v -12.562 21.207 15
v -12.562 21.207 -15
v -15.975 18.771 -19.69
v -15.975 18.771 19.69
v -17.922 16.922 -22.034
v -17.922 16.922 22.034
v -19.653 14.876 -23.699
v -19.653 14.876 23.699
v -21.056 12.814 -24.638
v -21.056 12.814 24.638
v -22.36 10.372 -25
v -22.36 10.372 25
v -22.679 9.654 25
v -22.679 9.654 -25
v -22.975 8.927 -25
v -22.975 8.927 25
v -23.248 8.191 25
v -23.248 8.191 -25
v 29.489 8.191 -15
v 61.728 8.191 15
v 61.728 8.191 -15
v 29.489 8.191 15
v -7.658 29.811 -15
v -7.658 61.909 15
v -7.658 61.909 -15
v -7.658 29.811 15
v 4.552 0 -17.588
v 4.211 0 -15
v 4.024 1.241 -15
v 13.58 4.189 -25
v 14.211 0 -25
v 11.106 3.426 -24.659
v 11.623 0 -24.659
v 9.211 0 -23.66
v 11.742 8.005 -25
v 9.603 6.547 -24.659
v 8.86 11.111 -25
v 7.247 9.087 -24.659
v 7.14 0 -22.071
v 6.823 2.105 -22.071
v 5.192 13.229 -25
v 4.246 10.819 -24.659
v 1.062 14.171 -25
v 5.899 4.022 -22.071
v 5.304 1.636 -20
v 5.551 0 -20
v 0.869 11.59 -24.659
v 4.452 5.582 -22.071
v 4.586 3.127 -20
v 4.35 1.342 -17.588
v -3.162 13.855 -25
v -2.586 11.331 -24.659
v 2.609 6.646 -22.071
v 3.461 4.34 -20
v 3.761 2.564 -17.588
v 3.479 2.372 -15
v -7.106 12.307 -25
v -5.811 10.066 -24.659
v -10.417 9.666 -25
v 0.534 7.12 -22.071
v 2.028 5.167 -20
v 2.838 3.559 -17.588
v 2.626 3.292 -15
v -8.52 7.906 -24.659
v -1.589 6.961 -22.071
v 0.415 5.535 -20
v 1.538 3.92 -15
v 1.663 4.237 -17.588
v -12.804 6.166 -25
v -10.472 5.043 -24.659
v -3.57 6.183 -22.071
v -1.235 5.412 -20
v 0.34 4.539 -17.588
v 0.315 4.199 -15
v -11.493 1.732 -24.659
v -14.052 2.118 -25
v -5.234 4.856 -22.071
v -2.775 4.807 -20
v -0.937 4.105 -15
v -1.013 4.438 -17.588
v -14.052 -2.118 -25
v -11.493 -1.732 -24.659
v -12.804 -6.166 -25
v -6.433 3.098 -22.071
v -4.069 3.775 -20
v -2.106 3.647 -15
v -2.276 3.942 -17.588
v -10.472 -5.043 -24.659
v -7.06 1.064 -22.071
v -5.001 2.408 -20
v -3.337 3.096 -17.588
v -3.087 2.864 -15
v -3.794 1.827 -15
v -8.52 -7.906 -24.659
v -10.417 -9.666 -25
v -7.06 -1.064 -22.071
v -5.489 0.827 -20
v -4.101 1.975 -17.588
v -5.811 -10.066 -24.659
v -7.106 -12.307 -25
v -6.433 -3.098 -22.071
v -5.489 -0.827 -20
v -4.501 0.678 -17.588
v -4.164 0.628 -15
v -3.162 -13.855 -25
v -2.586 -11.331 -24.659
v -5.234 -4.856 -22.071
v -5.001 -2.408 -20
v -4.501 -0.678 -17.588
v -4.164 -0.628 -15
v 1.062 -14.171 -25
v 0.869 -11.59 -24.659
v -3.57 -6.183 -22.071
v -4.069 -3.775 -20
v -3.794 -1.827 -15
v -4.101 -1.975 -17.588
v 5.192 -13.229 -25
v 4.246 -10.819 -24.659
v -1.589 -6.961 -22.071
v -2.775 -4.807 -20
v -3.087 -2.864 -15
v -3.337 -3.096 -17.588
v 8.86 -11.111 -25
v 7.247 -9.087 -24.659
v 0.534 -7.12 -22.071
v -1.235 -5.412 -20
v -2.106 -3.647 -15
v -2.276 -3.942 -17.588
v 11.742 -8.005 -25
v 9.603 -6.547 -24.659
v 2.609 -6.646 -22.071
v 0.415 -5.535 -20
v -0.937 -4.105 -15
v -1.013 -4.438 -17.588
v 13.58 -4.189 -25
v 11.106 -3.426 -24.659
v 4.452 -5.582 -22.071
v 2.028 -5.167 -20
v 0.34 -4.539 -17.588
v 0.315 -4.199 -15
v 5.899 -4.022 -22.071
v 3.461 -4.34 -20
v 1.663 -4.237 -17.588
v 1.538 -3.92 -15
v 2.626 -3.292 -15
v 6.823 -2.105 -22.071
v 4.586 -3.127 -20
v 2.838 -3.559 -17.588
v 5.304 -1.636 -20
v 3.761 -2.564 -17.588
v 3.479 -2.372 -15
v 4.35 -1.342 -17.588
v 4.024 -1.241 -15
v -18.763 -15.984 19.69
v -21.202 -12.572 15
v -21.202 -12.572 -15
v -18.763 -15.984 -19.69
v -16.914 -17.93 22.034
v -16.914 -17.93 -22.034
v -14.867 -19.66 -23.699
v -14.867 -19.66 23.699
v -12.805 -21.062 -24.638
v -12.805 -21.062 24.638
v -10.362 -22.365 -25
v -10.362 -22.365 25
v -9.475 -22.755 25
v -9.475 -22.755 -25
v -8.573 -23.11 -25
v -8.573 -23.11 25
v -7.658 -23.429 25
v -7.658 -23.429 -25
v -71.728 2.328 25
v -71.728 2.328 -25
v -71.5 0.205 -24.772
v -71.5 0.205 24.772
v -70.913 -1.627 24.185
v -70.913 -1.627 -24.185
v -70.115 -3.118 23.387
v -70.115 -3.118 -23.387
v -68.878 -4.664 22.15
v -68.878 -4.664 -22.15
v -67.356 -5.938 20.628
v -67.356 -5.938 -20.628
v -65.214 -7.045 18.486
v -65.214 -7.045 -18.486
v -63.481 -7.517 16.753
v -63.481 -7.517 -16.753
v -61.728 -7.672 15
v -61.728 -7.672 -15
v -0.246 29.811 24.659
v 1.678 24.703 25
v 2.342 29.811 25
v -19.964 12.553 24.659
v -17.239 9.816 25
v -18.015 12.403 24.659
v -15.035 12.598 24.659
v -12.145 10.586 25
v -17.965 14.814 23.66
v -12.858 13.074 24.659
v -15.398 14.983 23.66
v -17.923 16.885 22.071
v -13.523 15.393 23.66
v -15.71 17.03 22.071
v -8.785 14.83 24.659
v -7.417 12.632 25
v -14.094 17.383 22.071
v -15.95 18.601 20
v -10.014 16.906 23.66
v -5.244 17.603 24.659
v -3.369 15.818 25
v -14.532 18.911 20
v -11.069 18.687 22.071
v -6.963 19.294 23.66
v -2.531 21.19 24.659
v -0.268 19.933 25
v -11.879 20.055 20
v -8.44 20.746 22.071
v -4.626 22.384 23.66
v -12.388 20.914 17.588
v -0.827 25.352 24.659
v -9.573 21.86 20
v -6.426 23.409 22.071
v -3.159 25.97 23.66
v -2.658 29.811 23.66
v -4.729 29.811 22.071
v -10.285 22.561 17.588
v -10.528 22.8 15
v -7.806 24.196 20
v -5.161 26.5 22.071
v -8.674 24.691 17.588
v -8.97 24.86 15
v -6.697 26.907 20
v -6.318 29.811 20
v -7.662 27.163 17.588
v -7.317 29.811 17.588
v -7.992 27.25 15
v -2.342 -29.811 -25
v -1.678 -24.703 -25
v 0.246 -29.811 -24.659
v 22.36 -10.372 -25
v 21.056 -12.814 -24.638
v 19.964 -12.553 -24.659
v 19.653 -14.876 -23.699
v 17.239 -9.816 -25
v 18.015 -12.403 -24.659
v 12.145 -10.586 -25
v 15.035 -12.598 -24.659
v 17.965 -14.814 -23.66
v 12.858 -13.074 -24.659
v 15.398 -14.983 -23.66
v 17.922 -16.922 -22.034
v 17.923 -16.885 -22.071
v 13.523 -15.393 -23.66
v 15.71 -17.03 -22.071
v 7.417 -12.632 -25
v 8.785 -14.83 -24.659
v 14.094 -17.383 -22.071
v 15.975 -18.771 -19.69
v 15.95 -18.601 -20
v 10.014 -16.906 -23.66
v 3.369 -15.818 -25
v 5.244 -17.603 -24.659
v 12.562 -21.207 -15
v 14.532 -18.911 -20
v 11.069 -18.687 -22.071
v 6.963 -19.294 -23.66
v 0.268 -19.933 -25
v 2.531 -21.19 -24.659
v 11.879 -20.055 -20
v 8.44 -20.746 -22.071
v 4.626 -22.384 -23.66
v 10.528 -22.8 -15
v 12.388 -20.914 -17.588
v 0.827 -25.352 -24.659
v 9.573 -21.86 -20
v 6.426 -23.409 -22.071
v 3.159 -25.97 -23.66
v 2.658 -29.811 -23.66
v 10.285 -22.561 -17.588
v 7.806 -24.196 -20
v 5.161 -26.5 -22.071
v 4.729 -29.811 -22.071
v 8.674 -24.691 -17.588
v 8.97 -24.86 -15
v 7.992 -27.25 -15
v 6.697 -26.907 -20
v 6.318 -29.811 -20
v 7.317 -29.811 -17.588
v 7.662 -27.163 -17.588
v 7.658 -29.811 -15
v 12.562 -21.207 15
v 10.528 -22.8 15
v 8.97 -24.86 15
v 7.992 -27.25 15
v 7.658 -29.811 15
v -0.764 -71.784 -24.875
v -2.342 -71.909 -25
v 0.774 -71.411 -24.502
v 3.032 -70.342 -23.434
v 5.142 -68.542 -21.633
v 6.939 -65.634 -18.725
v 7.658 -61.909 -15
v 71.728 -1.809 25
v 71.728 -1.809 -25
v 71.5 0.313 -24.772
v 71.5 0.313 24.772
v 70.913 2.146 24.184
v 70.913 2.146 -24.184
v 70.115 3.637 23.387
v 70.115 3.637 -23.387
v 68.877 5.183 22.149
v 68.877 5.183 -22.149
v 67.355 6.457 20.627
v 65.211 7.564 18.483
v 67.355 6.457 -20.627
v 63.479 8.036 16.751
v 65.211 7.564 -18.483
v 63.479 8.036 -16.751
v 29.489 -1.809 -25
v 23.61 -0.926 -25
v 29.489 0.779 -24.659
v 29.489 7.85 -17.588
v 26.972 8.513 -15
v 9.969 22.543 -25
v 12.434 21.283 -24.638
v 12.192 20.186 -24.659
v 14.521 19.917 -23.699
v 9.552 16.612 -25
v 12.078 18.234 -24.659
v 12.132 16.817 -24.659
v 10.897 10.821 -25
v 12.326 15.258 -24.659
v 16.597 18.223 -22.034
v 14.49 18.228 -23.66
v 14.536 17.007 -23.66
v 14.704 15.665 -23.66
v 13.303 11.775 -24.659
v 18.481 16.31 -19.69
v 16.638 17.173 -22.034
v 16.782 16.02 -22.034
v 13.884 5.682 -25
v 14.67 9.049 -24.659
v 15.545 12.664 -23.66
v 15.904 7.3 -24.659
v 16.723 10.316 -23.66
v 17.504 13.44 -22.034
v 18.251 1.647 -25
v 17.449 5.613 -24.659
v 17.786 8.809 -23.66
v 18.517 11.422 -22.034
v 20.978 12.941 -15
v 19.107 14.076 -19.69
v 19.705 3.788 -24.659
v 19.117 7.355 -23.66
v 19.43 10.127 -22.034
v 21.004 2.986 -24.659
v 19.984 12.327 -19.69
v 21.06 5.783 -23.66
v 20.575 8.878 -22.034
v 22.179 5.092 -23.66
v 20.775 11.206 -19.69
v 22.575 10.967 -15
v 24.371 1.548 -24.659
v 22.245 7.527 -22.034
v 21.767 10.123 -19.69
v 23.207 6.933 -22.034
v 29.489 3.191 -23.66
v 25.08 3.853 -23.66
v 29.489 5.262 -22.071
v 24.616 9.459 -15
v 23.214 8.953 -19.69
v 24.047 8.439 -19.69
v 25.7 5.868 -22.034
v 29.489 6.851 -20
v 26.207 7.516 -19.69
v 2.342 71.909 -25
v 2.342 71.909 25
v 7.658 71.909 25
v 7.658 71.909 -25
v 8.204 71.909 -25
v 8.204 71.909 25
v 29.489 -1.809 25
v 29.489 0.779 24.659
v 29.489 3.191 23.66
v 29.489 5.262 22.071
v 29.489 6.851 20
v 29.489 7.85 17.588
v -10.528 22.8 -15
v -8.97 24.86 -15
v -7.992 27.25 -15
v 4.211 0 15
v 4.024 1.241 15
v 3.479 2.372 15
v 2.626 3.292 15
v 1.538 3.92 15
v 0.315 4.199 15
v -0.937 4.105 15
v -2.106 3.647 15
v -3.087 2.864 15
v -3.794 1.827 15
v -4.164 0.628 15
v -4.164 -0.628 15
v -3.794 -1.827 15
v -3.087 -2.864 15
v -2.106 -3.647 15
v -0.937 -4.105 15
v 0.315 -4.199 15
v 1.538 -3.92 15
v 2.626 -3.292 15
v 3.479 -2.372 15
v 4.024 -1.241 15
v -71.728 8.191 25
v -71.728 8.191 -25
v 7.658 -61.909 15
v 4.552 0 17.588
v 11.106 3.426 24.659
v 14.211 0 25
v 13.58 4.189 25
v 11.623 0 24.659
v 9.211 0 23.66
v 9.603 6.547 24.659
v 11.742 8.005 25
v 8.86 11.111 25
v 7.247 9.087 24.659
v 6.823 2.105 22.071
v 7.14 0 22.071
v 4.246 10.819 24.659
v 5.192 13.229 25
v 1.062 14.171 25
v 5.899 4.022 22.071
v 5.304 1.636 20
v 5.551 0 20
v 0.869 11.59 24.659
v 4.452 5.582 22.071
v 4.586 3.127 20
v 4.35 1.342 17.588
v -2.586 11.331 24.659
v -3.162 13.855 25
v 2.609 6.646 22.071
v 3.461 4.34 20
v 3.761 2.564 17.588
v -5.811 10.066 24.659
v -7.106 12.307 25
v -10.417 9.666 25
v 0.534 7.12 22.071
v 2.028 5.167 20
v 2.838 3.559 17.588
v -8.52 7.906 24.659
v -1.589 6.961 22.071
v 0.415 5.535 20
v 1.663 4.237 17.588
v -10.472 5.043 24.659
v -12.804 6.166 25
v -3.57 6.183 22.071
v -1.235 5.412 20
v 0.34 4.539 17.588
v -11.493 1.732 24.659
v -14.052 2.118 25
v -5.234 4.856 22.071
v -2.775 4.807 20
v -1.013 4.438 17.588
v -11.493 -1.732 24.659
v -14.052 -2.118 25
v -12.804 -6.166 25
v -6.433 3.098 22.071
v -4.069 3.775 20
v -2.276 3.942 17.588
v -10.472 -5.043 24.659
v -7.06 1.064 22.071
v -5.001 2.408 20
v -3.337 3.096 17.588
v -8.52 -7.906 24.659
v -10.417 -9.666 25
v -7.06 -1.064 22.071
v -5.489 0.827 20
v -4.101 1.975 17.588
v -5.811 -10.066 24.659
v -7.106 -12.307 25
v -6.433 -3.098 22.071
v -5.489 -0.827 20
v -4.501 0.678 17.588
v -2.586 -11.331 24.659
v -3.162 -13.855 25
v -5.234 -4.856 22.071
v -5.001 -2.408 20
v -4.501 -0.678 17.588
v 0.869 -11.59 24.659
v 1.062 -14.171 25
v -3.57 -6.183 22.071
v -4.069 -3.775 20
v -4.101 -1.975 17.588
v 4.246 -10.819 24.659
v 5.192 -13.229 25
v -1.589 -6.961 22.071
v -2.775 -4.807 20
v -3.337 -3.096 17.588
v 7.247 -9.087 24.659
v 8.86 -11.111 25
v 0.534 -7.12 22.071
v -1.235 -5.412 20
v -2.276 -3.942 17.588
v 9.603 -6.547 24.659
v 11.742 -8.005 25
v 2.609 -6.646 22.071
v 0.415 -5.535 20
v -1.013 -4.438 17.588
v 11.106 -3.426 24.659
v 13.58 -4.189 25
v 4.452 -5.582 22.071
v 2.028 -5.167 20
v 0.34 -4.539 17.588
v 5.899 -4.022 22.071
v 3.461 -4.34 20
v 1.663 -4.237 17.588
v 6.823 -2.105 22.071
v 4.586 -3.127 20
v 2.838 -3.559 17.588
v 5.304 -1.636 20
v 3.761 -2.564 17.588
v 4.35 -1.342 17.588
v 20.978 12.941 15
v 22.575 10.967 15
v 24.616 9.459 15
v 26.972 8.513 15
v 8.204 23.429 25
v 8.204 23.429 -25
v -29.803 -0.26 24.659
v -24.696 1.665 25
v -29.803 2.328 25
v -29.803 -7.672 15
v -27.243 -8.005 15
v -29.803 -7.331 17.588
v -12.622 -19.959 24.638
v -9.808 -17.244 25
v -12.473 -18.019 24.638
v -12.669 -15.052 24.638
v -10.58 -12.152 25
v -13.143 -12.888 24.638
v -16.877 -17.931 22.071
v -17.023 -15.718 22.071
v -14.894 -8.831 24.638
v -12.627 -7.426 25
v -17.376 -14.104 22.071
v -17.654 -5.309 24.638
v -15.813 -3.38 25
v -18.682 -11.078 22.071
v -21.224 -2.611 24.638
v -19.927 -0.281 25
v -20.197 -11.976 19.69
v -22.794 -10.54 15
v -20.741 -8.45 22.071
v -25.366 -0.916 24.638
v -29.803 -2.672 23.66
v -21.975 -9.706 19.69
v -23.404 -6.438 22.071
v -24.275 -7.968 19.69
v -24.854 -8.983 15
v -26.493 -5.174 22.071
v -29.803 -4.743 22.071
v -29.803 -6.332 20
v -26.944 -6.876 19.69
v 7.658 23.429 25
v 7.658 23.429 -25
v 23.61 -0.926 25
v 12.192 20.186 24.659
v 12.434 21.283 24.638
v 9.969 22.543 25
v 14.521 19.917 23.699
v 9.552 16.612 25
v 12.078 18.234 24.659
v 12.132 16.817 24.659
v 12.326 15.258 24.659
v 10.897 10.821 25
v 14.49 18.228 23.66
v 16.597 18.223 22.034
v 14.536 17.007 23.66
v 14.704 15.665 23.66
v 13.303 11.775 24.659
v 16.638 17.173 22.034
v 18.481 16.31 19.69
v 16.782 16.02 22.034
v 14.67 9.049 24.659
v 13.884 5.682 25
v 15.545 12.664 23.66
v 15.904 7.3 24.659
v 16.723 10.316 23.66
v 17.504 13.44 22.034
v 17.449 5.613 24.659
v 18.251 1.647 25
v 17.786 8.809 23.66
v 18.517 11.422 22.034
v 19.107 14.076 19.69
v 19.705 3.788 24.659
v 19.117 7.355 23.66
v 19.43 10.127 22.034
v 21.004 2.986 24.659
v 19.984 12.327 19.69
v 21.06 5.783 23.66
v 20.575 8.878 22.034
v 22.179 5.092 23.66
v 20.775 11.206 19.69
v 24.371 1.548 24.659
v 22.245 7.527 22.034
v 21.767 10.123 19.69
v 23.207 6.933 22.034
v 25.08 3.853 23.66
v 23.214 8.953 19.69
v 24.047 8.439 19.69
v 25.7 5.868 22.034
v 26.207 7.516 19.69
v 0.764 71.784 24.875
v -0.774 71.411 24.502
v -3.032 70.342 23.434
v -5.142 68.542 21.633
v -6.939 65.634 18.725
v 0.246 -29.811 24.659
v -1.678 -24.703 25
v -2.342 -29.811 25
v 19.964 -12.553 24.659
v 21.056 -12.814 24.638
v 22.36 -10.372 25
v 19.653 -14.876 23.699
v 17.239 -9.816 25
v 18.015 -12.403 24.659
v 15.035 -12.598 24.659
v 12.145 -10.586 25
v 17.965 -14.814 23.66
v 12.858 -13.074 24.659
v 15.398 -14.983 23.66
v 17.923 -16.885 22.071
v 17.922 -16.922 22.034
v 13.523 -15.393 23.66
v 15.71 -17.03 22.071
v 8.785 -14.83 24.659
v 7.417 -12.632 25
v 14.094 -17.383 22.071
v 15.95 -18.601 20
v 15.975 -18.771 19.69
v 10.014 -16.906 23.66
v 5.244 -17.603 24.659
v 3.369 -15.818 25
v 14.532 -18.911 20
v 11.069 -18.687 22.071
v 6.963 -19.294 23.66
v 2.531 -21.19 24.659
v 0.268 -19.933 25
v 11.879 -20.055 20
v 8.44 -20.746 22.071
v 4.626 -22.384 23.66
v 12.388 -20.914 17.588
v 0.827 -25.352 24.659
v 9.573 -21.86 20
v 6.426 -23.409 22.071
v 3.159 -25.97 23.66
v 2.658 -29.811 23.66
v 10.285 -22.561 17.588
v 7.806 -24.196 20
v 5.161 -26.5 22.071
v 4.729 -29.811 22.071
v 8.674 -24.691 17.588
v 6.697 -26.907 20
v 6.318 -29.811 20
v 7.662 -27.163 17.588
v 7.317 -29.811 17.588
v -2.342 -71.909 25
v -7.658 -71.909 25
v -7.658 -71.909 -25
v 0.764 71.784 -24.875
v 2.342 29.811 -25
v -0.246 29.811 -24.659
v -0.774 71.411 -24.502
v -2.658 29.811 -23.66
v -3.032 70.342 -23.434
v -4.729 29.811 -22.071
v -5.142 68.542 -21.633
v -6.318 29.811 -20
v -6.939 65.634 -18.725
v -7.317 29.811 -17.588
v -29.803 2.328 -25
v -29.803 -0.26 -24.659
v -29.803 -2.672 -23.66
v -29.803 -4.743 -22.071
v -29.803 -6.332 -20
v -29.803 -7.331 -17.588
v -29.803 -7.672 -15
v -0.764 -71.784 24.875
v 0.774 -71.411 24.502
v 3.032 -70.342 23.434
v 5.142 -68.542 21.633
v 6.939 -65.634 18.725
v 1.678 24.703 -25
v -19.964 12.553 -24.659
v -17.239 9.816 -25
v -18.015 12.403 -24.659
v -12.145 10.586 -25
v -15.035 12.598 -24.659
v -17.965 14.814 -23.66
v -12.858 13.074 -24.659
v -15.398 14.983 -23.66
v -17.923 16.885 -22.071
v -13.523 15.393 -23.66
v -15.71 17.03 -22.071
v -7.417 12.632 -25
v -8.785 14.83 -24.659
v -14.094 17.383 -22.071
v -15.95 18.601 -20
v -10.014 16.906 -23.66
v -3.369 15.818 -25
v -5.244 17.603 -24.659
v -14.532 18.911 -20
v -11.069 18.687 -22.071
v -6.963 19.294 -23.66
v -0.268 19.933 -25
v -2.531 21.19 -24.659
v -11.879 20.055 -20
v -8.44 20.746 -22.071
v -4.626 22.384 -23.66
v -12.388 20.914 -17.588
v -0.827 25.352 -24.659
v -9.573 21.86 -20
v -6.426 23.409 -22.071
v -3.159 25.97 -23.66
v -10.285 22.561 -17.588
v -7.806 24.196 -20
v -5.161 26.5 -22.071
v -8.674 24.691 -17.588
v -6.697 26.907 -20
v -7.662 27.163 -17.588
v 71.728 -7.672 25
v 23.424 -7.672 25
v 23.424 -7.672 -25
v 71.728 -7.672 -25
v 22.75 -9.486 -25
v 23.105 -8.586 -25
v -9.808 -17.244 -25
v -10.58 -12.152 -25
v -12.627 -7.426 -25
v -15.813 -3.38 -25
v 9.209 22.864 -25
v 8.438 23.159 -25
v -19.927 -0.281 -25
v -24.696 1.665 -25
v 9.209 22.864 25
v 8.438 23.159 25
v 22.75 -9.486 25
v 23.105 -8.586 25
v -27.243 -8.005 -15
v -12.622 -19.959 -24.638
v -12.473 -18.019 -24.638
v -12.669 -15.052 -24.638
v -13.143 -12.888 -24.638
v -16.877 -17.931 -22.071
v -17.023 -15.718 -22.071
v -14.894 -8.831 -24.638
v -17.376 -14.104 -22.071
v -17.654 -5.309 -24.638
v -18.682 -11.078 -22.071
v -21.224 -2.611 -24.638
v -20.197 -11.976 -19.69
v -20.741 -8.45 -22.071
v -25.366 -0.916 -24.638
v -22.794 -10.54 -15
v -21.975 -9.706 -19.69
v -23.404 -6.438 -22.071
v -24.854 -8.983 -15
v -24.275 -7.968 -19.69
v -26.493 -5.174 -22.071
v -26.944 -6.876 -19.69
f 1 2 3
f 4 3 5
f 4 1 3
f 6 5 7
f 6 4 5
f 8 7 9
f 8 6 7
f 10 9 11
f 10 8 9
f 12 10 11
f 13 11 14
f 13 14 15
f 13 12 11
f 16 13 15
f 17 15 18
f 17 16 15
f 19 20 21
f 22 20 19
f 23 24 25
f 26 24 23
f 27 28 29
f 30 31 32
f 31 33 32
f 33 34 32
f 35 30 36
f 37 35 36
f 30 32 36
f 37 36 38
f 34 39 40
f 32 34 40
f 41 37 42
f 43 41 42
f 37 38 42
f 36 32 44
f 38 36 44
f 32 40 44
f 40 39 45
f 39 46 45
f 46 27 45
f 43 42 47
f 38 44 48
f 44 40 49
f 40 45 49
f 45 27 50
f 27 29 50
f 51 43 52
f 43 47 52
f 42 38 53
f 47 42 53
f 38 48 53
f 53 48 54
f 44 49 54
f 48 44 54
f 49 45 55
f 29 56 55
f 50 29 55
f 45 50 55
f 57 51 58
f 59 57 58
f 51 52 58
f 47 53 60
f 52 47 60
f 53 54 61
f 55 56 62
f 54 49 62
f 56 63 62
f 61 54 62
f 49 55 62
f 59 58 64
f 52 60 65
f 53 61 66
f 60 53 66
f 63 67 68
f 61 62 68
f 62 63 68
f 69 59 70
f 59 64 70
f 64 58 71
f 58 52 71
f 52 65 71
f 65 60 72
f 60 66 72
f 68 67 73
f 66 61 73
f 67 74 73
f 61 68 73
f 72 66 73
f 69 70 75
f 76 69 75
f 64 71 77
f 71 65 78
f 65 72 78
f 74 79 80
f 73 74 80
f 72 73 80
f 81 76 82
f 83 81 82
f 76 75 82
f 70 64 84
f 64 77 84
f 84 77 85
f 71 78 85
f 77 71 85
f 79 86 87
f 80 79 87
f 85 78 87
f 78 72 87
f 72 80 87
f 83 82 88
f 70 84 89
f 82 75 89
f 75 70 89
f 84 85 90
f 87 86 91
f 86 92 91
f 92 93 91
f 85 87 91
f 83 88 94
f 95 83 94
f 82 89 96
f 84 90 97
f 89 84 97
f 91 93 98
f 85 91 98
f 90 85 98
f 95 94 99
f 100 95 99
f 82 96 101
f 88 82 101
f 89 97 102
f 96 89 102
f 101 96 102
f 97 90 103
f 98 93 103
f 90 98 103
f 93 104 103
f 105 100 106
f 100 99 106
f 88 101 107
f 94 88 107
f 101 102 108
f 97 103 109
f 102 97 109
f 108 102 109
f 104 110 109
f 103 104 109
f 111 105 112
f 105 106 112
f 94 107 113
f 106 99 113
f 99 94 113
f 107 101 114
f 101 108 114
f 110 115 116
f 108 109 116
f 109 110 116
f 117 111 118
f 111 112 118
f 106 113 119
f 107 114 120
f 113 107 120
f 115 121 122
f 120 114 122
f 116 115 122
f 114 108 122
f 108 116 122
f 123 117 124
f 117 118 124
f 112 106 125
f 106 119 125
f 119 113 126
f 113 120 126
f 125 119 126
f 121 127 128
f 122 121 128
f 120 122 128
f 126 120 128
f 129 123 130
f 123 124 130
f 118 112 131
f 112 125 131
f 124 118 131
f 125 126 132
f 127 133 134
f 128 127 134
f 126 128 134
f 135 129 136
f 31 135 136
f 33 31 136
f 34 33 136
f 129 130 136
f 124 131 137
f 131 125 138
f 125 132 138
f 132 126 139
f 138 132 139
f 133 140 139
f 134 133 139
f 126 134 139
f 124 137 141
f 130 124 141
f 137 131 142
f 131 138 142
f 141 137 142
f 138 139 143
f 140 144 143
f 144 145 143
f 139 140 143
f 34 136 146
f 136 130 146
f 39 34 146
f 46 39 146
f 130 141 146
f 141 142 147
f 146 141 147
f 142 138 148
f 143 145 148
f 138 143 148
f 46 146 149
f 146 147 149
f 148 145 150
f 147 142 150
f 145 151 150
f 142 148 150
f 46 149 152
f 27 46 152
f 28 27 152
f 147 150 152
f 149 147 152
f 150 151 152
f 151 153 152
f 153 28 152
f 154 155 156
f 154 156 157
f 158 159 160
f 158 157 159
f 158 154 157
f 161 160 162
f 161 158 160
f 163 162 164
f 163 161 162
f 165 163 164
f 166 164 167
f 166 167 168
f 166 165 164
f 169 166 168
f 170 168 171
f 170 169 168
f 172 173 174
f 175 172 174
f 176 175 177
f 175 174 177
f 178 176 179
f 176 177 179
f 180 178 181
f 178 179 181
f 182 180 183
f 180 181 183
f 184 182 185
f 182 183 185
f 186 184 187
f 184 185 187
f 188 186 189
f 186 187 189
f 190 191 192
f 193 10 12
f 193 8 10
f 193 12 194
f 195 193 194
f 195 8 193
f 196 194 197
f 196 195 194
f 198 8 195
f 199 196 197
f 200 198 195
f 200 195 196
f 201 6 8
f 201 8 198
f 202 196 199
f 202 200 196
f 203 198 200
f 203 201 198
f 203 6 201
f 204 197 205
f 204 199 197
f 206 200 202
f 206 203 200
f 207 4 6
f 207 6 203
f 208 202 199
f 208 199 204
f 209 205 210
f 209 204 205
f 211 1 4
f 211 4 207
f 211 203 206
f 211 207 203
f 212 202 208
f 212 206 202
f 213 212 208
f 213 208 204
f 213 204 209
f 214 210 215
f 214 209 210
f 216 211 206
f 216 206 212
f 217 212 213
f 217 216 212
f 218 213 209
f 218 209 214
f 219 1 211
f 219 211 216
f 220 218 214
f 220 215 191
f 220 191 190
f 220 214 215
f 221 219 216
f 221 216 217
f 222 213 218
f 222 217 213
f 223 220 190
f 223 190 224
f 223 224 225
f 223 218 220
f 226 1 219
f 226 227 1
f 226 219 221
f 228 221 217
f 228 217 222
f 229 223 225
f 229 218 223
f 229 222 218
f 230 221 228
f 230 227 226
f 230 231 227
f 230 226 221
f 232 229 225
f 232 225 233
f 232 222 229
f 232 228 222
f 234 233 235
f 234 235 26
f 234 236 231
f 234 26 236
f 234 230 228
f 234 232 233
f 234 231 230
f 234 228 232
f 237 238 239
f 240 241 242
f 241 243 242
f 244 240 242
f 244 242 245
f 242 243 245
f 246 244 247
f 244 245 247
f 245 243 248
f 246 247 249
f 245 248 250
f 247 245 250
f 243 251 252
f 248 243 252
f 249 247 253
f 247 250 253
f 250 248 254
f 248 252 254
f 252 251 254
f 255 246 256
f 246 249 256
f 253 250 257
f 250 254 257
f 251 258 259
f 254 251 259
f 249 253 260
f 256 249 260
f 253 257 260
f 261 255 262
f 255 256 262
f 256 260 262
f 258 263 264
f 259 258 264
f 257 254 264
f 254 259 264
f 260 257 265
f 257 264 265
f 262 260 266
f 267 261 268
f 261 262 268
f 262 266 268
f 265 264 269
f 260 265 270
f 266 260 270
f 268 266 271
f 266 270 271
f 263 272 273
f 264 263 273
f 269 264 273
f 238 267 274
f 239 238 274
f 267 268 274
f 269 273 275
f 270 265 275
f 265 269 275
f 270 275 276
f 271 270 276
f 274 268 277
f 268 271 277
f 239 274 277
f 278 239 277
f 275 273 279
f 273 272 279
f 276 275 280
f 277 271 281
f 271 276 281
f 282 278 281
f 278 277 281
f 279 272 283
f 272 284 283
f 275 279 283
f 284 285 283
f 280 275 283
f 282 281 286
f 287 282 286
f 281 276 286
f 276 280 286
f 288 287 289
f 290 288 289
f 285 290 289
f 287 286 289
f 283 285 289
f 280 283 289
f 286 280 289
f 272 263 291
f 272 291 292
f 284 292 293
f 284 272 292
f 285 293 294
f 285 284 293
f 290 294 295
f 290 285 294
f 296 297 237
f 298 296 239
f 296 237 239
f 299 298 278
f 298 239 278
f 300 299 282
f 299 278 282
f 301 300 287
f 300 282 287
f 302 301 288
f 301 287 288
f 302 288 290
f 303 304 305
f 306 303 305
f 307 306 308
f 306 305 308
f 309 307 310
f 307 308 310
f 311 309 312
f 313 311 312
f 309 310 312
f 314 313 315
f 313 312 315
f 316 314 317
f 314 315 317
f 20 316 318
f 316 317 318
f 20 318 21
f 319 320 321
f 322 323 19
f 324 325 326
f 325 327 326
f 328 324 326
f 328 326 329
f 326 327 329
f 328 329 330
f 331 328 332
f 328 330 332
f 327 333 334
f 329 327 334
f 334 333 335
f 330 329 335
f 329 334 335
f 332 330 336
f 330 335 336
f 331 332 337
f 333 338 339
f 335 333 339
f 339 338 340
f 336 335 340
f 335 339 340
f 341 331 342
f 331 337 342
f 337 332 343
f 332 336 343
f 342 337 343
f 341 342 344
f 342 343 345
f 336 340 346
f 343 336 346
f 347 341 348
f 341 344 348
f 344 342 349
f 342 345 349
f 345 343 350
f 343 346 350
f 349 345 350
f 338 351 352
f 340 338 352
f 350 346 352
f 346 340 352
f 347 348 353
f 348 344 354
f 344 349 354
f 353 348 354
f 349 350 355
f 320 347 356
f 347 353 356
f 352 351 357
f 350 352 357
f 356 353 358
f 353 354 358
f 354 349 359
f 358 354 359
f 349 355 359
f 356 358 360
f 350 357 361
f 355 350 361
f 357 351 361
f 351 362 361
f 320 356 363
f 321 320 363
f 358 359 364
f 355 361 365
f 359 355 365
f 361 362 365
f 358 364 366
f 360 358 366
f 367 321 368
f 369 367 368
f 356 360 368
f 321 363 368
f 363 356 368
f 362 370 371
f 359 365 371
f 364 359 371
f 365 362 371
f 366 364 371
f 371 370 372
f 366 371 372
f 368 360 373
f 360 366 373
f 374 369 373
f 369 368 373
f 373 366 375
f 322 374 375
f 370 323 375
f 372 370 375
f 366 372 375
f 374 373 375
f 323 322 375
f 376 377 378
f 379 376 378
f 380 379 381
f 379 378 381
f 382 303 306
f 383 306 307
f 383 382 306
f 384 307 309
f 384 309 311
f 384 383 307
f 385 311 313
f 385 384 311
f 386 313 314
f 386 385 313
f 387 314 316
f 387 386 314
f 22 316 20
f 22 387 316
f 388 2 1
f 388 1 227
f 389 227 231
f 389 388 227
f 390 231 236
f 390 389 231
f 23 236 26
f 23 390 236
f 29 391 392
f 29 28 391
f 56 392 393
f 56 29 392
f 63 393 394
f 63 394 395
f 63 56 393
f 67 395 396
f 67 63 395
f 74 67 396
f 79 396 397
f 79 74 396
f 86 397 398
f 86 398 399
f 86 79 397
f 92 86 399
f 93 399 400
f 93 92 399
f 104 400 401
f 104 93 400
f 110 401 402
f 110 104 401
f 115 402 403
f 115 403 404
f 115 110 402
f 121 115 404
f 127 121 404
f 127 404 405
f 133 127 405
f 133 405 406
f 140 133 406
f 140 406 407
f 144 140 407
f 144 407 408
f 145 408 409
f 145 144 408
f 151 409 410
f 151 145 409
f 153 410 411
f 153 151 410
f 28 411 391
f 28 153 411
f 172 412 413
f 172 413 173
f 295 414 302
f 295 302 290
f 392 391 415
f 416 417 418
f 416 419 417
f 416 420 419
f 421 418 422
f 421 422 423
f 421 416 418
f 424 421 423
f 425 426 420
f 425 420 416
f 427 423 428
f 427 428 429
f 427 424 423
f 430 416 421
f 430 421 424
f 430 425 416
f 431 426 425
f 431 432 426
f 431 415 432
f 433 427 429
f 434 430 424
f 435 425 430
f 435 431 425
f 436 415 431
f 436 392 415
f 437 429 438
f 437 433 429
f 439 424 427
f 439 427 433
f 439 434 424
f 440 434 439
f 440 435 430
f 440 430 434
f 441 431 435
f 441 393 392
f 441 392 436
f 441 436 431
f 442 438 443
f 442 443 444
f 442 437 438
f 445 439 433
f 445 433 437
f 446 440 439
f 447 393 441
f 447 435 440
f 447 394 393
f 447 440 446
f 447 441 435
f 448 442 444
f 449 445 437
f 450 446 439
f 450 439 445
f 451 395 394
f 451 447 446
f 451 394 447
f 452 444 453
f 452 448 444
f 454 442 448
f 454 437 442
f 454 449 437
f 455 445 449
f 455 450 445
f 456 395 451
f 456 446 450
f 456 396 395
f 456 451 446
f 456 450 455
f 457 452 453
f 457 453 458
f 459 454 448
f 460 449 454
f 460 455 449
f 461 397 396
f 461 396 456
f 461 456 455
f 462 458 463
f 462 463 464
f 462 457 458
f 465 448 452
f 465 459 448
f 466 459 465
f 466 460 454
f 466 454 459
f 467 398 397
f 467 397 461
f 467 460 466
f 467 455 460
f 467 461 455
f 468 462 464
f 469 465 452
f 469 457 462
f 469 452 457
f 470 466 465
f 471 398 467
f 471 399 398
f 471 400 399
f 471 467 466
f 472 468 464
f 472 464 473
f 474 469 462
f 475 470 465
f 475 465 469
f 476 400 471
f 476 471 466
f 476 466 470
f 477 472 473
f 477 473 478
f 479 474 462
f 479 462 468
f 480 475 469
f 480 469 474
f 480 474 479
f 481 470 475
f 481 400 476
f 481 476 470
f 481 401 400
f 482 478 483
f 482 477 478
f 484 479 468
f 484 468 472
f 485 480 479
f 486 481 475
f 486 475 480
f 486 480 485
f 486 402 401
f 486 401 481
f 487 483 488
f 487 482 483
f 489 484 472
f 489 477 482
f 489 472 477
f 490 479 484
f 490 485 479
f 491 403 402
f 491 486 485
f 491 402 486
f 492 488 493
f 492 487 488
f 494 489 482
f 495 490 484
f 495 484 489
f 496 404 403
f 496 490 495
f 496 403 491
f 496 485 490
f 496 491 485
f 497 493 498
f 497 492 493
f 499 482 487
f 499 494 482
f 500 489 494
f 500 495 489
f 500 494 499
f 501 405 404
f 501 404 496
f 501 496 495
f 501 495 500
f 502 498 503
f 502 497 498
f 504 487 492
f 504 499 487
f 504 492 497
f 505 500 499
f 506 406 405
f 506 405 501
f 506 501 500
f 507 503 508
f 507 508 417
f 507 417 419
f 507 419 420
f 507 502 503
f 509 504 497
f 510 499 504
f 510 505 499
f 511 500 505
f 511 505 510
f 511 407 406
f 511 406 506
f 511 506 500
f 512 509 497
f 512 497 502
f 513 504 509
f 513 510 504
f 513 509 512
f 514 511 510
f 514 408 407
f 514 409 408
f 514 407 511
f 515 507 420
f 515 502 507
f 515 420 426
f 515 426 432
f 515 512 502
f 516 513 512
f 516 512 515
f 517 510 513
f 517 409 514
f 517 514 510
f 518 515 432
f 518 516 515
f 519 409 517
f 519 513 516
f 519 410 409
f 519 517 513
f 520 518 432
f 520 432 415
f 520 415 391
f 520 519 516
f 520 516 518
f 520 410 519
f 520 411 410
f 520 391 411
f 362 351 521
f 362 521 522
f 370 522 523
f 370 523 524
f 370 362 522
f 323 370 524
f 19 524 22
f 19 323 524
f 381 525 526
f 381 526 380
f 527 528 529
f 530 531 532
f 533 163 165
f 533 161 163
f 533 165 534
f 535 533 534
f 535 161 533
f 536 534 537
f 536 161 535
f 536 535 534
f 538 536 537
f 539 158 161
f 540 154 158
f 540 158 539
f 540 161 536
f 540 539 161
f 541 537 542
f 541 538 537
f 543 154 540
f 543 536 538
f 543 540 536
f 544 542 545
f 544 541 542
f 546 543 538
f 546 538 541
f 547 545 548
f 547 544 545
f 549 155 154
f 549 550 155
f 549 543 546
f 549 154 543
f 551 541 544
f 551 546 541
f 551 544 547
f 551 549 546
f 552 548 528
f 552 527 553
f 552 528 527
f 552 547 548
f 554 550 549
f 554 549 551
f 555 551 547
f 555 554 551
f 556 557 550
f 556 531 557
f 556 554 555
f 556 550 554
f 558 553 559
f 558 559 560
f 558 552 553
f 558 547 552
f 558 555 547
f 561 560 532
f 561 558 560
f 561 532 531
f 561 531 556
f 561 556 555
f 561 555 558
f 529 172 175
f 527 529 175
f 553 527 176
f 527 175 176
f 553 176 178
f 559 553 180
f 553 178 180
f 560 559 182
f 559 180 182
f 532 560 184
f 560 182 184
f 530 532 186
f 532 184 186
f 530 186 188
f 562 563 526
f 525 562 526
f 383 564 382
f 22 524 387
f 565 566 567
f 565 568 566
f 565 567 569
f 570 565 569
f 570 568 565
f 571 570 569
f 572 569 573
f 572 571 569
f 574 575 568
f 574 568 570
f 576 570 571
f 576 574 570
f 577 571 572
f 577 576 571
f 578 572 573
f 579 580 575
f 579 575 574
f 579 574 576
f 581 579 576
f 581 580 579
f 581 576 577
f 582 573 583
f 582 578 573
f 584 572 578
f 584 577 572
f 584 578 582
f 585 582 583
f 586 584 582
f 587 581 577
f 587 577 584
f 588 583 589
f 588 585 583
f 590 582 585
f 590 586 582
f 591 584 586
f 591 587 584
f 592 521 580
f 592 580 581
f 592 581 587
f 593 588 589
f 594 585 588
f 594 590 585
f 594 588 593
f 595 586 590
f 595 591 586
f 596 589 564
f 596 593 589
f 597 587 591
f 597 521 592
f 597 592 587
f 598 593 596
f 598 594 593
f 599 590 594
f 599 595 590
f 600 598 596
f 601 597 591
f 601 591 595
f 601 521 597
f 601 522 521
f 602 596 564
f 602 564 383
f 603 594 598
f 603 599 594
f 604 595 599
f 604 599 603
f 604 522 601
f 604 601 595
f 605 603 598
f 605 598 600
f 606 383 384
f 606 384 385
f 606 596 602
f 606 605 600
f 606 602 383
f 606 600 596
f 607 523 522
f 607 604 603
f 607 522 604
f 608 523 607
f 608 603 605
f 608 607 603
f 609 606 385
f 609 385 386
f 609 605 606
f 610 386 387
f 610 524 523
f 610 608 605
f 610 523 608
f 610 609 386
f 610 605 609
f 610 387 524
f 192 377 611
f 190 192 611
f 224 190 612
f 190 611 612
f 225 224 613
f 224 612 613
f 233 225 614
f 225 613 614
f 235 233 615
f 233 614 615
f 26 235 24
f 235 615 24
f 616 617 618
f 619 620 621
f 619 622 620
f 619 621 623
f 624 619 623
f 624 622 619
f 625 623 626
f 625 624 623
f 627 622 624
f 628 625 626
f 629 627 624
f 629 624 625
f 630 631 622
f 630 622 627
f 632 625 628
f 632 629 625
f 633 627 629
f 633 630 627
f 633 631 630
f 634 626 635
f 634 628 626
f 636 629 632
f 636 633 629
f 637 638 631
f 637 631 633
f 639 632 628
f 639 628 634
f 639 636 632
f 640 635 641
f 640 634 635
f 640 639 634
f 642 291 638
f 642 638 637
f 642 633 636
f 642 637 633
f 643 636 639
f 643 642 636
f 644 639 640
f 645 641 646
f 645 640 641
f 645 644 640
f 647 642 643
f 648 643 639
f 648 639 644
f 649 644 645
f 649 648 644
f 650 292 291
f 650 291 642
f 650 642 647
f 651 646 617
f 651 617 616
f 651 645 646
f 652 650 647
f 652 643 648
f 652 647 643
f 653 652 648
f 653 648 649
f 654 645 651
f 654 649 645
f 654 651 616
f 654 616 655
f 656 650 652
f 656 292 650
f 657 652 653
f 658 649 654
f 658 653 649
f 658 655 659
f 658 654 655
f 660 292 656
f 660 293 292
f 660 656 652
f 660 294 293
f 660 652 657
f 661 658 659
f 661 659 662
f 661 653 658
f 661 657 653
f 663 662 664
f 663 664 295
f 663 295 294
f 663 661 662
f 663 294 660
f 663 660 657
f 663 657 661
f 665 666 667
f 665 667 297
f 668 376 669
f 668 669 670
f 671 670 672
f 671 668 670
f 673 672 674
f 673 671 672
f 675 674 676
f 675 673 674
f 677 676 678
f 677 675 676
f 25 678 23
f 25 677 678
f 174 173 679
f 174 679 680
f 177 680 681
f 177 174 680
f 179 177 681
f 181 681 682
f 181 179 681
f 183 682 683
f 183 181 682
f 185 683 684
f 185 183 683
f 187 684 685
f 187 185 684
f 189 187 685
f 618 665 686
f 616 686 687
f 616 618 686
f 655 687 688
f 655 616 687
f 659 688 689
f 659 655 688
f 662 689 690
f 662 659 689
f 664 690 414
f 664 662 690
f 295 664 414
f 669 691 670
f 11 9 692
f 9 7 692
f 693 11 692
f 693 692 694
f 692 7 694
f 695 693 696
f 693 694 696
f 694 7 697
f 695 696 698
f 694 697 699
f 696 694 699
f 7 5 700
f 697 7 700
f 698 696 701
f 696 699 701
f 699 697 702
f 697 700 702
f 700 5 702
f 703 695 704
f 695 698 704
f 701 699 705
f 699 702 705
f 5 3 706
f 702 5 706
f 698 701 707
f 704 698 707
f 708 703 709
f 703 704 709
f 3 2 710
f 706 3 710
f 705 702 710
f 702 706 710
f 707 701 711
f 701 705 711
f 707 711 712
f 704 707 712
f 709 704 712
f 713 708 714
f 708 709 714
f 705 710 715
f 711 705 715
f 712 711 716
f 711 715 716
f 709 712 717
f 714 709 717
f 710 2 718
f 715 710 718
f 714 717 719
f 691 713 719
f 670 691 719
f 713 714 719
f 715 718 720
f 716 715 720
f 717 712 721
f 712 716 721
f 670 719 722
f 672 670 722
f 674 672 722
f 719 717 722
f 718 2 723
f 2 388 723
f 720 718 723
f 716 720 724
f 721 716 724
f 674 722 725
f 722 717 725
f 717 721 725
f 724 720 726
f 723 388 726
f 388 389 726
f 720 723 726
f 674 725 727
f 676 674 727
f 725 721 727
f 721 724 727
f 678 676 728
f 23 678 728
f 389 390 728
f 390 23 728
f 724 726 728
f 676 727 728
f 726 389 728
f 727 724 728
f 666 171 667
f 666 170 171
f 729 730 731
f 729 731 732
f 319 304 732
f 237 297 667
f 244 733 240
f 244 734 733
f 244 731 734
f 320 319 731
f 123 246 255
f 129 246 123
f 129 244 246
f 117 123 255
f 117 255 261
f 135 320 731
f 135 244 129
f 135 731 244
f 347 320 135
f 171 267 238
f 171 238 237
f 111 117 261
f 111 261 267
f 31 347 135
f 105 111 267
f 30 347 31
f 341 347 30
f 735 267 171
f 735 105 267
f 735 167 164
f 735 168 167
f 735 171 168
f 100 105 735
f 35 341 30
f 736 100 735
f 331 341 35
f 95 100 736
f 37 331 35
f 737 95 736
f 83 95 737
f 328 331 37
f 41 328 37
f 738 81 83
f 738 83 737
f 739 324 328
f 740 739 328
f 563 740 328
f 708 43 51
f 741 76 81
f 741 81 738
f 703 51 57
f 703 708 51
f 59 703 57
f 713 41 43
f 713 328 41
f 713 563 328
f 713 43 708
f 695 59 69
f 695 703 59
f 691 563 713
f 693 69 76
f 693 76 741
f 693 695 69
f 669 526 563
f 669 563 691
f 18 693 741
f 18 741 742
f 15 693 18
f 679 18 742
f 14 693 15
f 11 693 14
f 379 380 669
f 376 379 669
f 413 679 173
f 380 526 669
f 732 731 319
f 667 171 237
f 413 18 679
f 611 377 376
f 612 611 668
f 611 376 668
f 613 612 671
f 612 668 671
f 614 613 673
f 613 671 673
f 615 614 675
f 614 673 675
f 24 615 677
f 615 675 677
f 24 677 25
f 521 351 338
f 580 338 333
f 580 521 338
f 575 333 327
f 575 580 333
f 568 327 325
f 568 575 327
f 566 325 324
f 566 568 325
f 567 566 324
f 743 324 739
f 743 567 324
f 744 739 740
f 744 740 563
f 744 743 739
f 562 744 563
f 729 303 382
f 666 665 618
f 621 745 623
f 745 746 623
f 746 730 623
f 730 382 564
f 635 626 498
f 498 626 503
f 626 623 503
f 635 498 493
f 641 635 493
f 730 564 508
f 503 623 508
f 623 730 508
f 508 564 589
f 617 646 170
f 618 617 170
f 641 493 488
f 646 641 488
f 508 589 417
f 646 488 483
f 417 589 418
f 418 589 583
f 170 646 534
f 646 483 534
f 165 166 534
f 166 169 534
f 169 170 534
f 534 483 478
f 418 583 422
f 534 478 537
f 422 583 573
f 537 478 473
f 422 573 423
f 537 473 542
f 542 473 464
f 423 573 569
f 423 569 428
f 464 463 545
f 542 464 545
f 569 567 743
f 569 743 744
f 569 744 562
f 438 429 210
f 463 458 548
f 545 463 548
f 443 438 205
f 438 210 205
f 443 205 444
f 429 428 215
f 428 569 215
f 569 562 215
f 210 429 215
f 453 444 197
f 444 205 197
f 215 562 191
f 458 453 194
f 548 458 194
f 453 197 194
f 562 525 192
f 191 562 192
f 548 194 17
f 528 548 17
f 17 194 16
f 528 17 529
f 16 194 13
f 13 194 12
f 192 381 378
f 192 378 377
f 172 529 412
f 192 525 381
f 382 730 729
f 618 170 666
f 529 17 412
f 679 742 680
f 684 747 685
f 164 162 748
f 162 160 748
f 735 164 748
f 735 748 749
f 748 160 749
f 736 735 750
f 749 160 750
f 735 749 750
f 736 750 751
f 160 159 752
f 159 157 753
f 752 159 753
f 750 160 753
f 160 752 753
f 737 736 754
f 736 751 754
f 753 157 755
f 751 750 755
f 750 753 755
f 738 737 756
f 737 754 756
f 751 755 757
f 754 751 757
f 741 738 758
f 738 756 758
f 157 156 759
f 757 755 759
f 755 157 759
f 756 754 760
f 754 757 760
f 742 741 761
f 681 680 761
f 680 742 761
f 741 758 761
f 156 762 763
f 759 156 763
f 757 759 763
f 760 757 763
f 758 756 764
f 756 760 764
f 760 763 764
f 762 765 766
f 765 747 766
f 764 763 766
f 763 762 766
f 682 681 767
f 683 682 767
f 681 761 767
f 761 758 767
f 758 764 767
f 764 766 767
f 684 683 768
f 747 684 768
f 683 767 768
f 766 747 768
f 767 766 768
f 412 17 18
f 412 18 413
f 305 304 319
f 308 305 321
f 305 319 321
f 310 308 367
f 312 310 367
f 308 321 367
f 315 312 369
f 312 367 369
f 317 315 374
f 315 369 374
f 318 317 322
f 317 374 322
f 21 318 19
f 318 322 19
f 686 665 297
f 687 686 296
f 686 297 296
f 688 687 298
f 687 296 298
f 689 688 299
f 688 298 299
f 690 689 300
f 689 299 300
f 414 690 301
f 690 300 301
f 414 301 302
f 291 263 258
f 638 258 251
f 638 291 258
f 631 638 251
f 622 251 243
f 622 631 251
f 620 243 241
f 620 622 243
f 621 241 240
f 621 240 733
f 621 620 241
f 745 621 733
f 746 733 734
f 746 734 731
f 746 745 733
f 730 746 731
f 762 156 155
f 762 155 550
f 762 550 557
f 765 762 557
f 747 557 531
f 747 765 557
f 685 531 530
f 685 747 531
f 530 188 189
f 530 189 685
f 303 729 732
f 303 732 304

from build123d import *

# Parameters (mm, degrees)
F0_R         = 4.211
F0_W         = 0.5461883944
F0_H         = 48.4801451702
F1_DEPTH     = 25
F2_T1_DEPTH  = 50
F2_T3_DEPTH  = 100
F2_T5_DEPTH  = 67.0975783302
F2_T7_DEPTH  = 67.2386600166
F2_T9_DEPTH  = 67.0975783302
F2_T11_DEPTH = 66.9249549756
F2_T18_ANGLE = 202.5983722588
F2_T20_ANGLE = 202.5983722588
F2_T22_ANGLE = 202.6248548609
F2_T24_ANGLE = 202.6248548609
F2_T26_ANGLE = 201.5951809175
F2_T28_ANGLE = 201.5951809175
F2_T30_ANGLE = 202.6248548609
F2_T32_ANGLE = 202.6248548609


# Not quite as in the source:
# - a fillet or chamfer that OpenCascade refuses, or shapes differently, is made with other operations: its cross-section is extruded or revolved along the edge and cut away or added


with BuildPart() as f1:
    # F0 (on Top) → F1 (new body, symmetric)
    with BuildSketch(Plane.XY):
        with BuildLine():
            Line((7.6582201656, -71.9089287116), (7.6582201656, -23.4287835415))
            ThreePointArc((7.6582201656, -23.4287835415), (17.4241101733, -17.4343516945), (23.4242794808, -7.6719857367))
            Line((23.4242794808, -7.6719857367), (71.7281472729, -7.6719857367))
            Line((71.7281472729, -7.6719857367), (71.7281472729, 8.1906429889))
            Line((71.7281472729, 8.1906429889), (23.2480021027, 8.1906429889))
            ThreePointArc((23.2480021027, 8.1906429889), (17.2293028181, 17.6268930541), (7.6582201656, 23.4287835415))
            Line((7.6582201656, 23.4287835415), (7.6582201656, 71.9089287116))
            Line((7.6582201656, 71.9089287116), (-7.6582201656, 71.9089287116))
            Line((-7.6582201656, 71.9089287116), (-7.6582201656, 23.4287835415))
            ThreePointArc((-7.6582201656, 23.4287835415), (-17.2293028181, 17.6268930541), (-23.2480021027, 8.1906429889))
            Line((-23.2480021027, 8.1906429889), (-71.7281472729, 8.1906429889))
            Line((-71.7281472729, 8.1906429889), (-71.7281472729, -7.6719857367))
            Line((-71.7281472729, -7.6719857367), (-23.4242794808, -7.6719857367))
            ThreePointArc((-23.4242794808, -7.6719857367), (-17.4241101733, -17.4343516945), (-7.6582201656, -23.4287835415))
            Line((-7.6582201656, -23.4287835415), (-7.6582201656, -71.9089287116))
            Line((-7.6582201656, -71.9089287116), (7.6582201656, -71.9089287116))
        make_face()
        Circle(F0_R, mode=Mode.SUBTRACT)
        with Locations((7.9313143628, 47.6688561266)):
            Rectangle(F0_W, F0_H)
    extrude(amount=F1_DEPTH, both=True)

    # F2: fillet of radius 10 on 18 edges, made by hand

    # F2_s2 → F2_t1 (join)
    with BuildSketch(Plane.XY.offset(-25)):
        with BuildLine():
            ThreePointArc((-12.5618550278, 21.2074522892), (-8.9701924441, 24.8597673709), (-7.6582201656, 29.8113503815))
            Line((-7.6582201656, 29.8113503815), (-7.6582201656, 23.4287835415))
            ThreePointArc((-7.6582201656, 23.4287835415), (-10.170862222, 22.4523895387), (-12.5618550278, 21.2074522892))
        make_face()
        with BuildLine():
            ThreePointArc((20.9784825584, 12.9406145096), (24.6161046934, 9.458510237), (29.4894872562, 8.1906429889))
            Line((29.4894872562, 8.1906429889), (23.2480021027, 8.1906429889))
            ThreePointArc((23.2480021027, 8.1906429889), (22.2404146484, 10.6263912316), (20.9784825584, 12.9406145096))
        make_face()
        with BuildLine():
            ThreePointArc((12.5618550278, -21.2074522892), (8.9701924441, -24.8597673709), (7.6582201656, -29.8113503815))
            Line((7.6582201656, -29.8113503815), (7.6582201656, -23.4287835415))
            ThreePointArc((7.6582201656, -23.4287835415), (10.170862222, -22.4523895387), (12.5618550278, -21.2074522892))
        make_face()
        with BuildLine():
            ThreePointArc((-21.2016487218, -12.5716476969), (-24.8536155677, -8.9828148787), (-29.8031922973, -7.6719857367))
            Line((-29.8031922973, -7.6719857367), (-23.4242794808, -7.6719857367))
            ThreePointArc((-23.4242794808, -7.6719857367), (-22.4470496684, -10.1826418734), (-21.2016487218, -12.5716476969))
        make_face()
    extrude(amount=F2_T1_DEPTH)

    # F2_s4 → F2_t3 (cut)
    with BuildSketch(Plane.XY.offset(-50)):
        with BuildLine():
            ThreePointArc((2.3417798344, 71.9089287116), (-4.7292879775, 68.9799965235), (-7.6582201656, 61.9089287116))
            Line((-7.6582201656, 61.9089287116), (-7.6582201656, 71.9089287116))
            Line((-7.6582201656, 71.9089287116), (2.3417798344, 71.9089287116))
        make_face()
        with BuildLine():
            ThreePointArc((71.7281472729, -1.8093570111), (68.7992150847, 5.2617108008), (61.7281472729, 8.1906429889))
            Line((61.7281472729, 8.1906429889), (71.7281472729, 8.1906429889))
            Line((71.7281472729, 8.1906429889), (71.7281472729, -1.8093570111))
        make_face()
        with BuildLine():
            ThreePointArc((-2.3417798344, -71.9089287116), (4.7292879775, -68.9799965235), (7.6582201656, -61.9089287116))
            Line((7.6582201656, -61.9089287116), (7.6582201656, -71.9089287116))
            Line((7.6582201656, -71.9089287116), (-2.3417798344, -71.9089287116))
        make_face()
        with BuildLine():
            ThreePointArc((-71.7281472729, 2.3280142633), (-68.7992150847, -4.7430535485), (-61.7281472729, -7.6719857367))
            Line((-61.7281472729, -7.6719857367), (-71.7281472729, -7.6719857367))
            Line((-71.7281472729, -7.6719857367), (-71.7281472729, 2.3280142633))
        make_face()
    extrude(amount=F2_T3_DEPTH, mode=Mode.SUBTRACT)

    # F2_s6 → F2_t5 (cut)
    with BuildSketch(Plane.XZ.offset(-96.9089287116)):
        with BuildLine():
            ThreePointArc((2.3417798344, -25), (-4.7292879775, -22.0710678119), (-7.6582201656, -15))
            Line((-7.6582201656, -15), (-7.6582201656, -25))
            Line((-7.6582201656, -25), (2.3417798344, -25))
        make_face()
        with BuildLine():
            ThreePointArc((2.3417798344, 25), (-4.7292879775, 22.0710678119), (-7.6582201656, 15))
            Line((-7.6582201656, 15), (-7.6582201656, 25))
            Line((-7.6582201656, 25), (2.3417798344, 25))
        make_face()
    extrude(amount=F2_T5_DEPTH, mode=Mode.SUBTRACT)

    # F2_s8 → F2_t7 (cut)
    with BuildSketch(Plane.YZ.offset(29.4894872562)):
        with BuildLine():
            ThreePointArc((-1.8093570111, -25), (5.2617108008, -22.0710678119), (8.1906429889, -15))
            Line((8.1906429889, -15), (8.1906429889, -25))
            Line((8.1906429889, -25), (-1.8093570111, -25))
        make_face()
        with BuildLine():
            ThreePointArc((-1.8093570111, 25), (5.2617108008, 22.0710678119), (8.1906429889, 15))
            Line((8.1906429889, 15), (8.1906429889, 25))
            Line((8.1906429889, 25), (-1.8093570111, 25))
        make_face()
    extrude(amount=F2_T7_DEPTH, mode=Mode.SUBTRACT)

    # F2_s10 → F2_t9 (cut)
    with BuildSketch(Plane.XZ.offset(29.8113503815)):
        with BuildLine():
            ThreePointArc((-2.3417798344, -25), (4.7292879775, -22.0710678119), (7.6582201656, -15))
            Line((7.6582201656, -15), (7.6582201656, -25))
            Line((7.6582201656, -25), (-2.3417798344, -25))
        make_face()
        with BuildLine():
            ThreePointArc((-2.3417798344, 25), (4.7292879775, 22.0710678119), (7.6582201656, 15))
            Line((7.6582201656, 15), (7.6582201656, 25))
            Line((7.6582201656, 25), (-2.3417798344, 25))
        make_face()
    extrude(amount=F2_T9_DEPTH, mode=Mode.SUBTRACT)

    # F2_s12 → F2_t11 (cut)
    with BuildSketch(Plane.YZ.offset(-96.7281472729)):
        with BuildLine():
            ThreePointArc((2.3280142633, -25), (-4.7430535485, -22.0710678119), (-7.6719857367, -15))
            Line((-7.6719857367, -15), (-7.6719857367, -25))
            Line((-7.6719857367, -25), (2.3280142633, -25))
        make_face()
        with BuildLine():
            ThreePointArc((2.3280142633, 25), (-4.7430535485, 22.0710678119), (-7.6719857367, 15))
            Line((-7.6719857367, 15), (-7.6719857367, 25))
            Line((-7.6719857367, 25), (2.3280142633, 25))
        make_face()
    extrude(amount=F2_T11_DEPTH, mode=Mode.SUBTRACT)

    # F2_s13 → F2_t14 (revolve, cut)
    with BuildSketch(Plane.XZ):
        with BuildLine():
            ThreePointArc((14.211, -25), (7.1399321881, -22.0710678119), (4.211, -15))
            Line((4.211, -15), (4.211, -25))
            Line((4.211, -25), (14.211, -25))
        make_face()
    revolve(axis=Axis((0, 0, -25), (0, 0, 1)), mode=Mode.SUBTRACT)

    # F2_s15 → F2_t16 (revolve, cut)
    with BuildSketch(Plane.XZ):
        with BuildLine():
            ThreePointArc((14.211, 25), (7.1399321881, 22.0710678119), (4.211, 15))
            Line((4.211, 15), (4.211, 25))
            Line((4.211, 25), (14.211, 25))
        make_face()
    revolve(axis=Axis((0, 0, 25), (0, 0, 1)), mode=Mode.SUBTRACT)

    # F2_s17 → F2_t18 (revolve, cut)
    with BuildSketch(Plane(origin=(-19.132963154, 7.963646146, 0), x_dir=(0, 0, 1), z_dir=(-0.9232211344, 0.3842690946, 0))):
        with BuildLine():
            ThreePointArc((25, -47.7675964389), (22.0710678119, -40.696528627), (15, -37.7675964389))
            Line((15, -37.7675964389), (25, -37.7675964389))
            Line((25, -37.7675964389), (25, -47.7675964389))
        make_face()
    revolve(axis=Axis((-29.8031922972, -17.6719857367, 25), (0, 0, 1)), revolution_arc=F2_T18_ANGLE, mode=Mode.SUBTRACT)

    # F2_s19 → F2_t20 (revolve, cut)
    with BuildSketch(Plane(origin=(-19.132963154, 7.963646146, 0), x_dir=(0, 0, 1), z_dir=(-0.9232211344, 0.3842690946, 0))):
        with BuildLine():
            ThreePointArc((-25, -47.7675964389), (-22.0710678119, -40.696528627), (-15, -37.7675964389))
            Line((-15, -37.7675964389), (-25, -37.7675964389))
            Line((-25, -37.7675964389), (-25, -47.7675964389))
        make_face()
    revolve(axis=Axis((-29.8031922972, -17.6719857367, -25), (0, 0, 1)), revolution_arc=F2_T20_ANGLE, mode=Mode.SUBTRACT)

    # F2_s21 → F2_t22 (revolve, cut)
    with BuildSketch(Plane(origin=(-7.9724845558, -19.1292702646, 0), x_dir=(0, 0, 1), z_dir=(-0.3846957743, -0.9230434233, 0))):
        with BuildLine():
            ThreePointArc((25, -47.7676045084), (22.0710678119, -40.6965366966), (15, -37.7676045084))
            Line((15, -37.7676045084), (25, -37.7676045084))
            Line((25, -37.7676045084), (25, -47.7676045084))
        make_face()
    revolve(axis=Axis((17.6582201656, -29.8113503815, 25), (0, 0, 1)), revolution_arc=F2_T22_ANGLE, mode=Mode.SUBTRACT)

    # F2_s23 → F2_t24 (revolve, cut)
    with BuildSketch(Plane(origin=(-7.9724845558, -19.1292702646, 0), x_dir=(0, 0, 1), z_dir=(-0.3846957743, -0.9230434233, 0))):
        with BuildLine():
            ThreePointArc((-25, -47.7676045084), (-22.0710678119, -40.6965366966), (-15, -37.7676045084))
            Line((-15, -37.7676045084), (-25, -37.7676045084))
            Line((-25, -37.7676045084), (-25, -47.7676045084))
        make_face()
    revolve(axis=Axis((17.6582201656, -29.8113503815, -25), (0, 0, 1)), revolution_arc=F2_T24_ANGLE, mode=Mode.SUBTRACT)

    # F2_s25 → F2_t26 (revolve, cut)
    with BuildSketch(Plane(origin=(19.2698363003, -7.6275931455, 0), x_dir=(0, 0, 1), z_dir=(0.9298074451, -0.3680463489, 0))):
        with BuildLine():
            ThreePointArc((25, -47.7672933998), (22.0710678119, -40.6962255879), (15, -37.7672933998))
            Line((15, -37.7672933998), (25, -37.7672933998))
            Line((25, -37.7672933998), (25, -47.7672933998))
        make_face()
    revolve(axis=Axis((29.4894872562, 18.1906429889, 25), (0, 0, 1)), revolution_arc=F2_T26_ANGLE, mode=Mode.SUBTRACT)

    # F2_s27 → F2_t28 (revolve, cut)
    with BuildSketch(Plane(origin=(19.2698363003, -7.6275931455, 0), x_dir=(0, 0, 1), z_dir=(0.9298074451, -0.3680463489, 0))):
        with BuildLine():
            ThreePointArc((-25, -47.7672933998), (-22.0710678119, -40.6962255879), (-15, -37.7672933998))
            Line((-15, -37.7672933998), (-25, -37.7672933998))
            Line((-25, -37.7672933998), (-25, -47.7672933998))
        make_face()
    revolve(axis=Axis((29.4894872562, 18.1906429889, -25), (0, 0, 1)), revolution_arc=F2_T28_ANGLE, mode=Mode.SUBTRACT)

    # F2_s29 → F2_t30 (revolve, cut)
    with BuildSketch(Plane(origin=(7.9724845558, 19.1292702646, 0), x_dir=(0, 0, 1), z_dir=(0.3846957743, 0.9230434233, 0))):
        with BuildLine():
            ThreePointArc((25, -47.7676045084), (22.0710678119, -40.6965366966), (15, -37.7676045084))
            Line((15, -37.7676045084), (25, -37.7676045084))
            Line((25, -37.7676045084), (25, -47.7676045084))
        make_face()
    revolve(axis=Axis((-17.6582201656, 29.8113503815, 25), (0, 0, 1)), revolution_arc=F2_T30_ANGLE, mode=Mode.SUBTRACT)

    # F2_s31 → F2_t32 (revolve, cut)
    with BuildSketch(Plane(origin=(7.9724845558, 19.1292702646, 0), x_dir=(0, 0, 1), z_dir=(0.3846957743, 0.9230434233, 0))):
        with BuildLine():
            ThreePointArc((-25, -47.7676045084), (-22.0710678119, -40.6965366966), (-15, -37.7676045084))
            Line((-15, -37.7676045084), (-25, -37.7676045084))
            Line((-25, -37.7676045084), (-25, -47.7676045084))
        make_face()
    revolve(axis=Axis((-17.6582201656, 29.8113503815, -25), (0, 0, 1)), revolution_arc=F2_T32_ANGLE, mode=Mode.SUBTRACT)


solid = f1.part
